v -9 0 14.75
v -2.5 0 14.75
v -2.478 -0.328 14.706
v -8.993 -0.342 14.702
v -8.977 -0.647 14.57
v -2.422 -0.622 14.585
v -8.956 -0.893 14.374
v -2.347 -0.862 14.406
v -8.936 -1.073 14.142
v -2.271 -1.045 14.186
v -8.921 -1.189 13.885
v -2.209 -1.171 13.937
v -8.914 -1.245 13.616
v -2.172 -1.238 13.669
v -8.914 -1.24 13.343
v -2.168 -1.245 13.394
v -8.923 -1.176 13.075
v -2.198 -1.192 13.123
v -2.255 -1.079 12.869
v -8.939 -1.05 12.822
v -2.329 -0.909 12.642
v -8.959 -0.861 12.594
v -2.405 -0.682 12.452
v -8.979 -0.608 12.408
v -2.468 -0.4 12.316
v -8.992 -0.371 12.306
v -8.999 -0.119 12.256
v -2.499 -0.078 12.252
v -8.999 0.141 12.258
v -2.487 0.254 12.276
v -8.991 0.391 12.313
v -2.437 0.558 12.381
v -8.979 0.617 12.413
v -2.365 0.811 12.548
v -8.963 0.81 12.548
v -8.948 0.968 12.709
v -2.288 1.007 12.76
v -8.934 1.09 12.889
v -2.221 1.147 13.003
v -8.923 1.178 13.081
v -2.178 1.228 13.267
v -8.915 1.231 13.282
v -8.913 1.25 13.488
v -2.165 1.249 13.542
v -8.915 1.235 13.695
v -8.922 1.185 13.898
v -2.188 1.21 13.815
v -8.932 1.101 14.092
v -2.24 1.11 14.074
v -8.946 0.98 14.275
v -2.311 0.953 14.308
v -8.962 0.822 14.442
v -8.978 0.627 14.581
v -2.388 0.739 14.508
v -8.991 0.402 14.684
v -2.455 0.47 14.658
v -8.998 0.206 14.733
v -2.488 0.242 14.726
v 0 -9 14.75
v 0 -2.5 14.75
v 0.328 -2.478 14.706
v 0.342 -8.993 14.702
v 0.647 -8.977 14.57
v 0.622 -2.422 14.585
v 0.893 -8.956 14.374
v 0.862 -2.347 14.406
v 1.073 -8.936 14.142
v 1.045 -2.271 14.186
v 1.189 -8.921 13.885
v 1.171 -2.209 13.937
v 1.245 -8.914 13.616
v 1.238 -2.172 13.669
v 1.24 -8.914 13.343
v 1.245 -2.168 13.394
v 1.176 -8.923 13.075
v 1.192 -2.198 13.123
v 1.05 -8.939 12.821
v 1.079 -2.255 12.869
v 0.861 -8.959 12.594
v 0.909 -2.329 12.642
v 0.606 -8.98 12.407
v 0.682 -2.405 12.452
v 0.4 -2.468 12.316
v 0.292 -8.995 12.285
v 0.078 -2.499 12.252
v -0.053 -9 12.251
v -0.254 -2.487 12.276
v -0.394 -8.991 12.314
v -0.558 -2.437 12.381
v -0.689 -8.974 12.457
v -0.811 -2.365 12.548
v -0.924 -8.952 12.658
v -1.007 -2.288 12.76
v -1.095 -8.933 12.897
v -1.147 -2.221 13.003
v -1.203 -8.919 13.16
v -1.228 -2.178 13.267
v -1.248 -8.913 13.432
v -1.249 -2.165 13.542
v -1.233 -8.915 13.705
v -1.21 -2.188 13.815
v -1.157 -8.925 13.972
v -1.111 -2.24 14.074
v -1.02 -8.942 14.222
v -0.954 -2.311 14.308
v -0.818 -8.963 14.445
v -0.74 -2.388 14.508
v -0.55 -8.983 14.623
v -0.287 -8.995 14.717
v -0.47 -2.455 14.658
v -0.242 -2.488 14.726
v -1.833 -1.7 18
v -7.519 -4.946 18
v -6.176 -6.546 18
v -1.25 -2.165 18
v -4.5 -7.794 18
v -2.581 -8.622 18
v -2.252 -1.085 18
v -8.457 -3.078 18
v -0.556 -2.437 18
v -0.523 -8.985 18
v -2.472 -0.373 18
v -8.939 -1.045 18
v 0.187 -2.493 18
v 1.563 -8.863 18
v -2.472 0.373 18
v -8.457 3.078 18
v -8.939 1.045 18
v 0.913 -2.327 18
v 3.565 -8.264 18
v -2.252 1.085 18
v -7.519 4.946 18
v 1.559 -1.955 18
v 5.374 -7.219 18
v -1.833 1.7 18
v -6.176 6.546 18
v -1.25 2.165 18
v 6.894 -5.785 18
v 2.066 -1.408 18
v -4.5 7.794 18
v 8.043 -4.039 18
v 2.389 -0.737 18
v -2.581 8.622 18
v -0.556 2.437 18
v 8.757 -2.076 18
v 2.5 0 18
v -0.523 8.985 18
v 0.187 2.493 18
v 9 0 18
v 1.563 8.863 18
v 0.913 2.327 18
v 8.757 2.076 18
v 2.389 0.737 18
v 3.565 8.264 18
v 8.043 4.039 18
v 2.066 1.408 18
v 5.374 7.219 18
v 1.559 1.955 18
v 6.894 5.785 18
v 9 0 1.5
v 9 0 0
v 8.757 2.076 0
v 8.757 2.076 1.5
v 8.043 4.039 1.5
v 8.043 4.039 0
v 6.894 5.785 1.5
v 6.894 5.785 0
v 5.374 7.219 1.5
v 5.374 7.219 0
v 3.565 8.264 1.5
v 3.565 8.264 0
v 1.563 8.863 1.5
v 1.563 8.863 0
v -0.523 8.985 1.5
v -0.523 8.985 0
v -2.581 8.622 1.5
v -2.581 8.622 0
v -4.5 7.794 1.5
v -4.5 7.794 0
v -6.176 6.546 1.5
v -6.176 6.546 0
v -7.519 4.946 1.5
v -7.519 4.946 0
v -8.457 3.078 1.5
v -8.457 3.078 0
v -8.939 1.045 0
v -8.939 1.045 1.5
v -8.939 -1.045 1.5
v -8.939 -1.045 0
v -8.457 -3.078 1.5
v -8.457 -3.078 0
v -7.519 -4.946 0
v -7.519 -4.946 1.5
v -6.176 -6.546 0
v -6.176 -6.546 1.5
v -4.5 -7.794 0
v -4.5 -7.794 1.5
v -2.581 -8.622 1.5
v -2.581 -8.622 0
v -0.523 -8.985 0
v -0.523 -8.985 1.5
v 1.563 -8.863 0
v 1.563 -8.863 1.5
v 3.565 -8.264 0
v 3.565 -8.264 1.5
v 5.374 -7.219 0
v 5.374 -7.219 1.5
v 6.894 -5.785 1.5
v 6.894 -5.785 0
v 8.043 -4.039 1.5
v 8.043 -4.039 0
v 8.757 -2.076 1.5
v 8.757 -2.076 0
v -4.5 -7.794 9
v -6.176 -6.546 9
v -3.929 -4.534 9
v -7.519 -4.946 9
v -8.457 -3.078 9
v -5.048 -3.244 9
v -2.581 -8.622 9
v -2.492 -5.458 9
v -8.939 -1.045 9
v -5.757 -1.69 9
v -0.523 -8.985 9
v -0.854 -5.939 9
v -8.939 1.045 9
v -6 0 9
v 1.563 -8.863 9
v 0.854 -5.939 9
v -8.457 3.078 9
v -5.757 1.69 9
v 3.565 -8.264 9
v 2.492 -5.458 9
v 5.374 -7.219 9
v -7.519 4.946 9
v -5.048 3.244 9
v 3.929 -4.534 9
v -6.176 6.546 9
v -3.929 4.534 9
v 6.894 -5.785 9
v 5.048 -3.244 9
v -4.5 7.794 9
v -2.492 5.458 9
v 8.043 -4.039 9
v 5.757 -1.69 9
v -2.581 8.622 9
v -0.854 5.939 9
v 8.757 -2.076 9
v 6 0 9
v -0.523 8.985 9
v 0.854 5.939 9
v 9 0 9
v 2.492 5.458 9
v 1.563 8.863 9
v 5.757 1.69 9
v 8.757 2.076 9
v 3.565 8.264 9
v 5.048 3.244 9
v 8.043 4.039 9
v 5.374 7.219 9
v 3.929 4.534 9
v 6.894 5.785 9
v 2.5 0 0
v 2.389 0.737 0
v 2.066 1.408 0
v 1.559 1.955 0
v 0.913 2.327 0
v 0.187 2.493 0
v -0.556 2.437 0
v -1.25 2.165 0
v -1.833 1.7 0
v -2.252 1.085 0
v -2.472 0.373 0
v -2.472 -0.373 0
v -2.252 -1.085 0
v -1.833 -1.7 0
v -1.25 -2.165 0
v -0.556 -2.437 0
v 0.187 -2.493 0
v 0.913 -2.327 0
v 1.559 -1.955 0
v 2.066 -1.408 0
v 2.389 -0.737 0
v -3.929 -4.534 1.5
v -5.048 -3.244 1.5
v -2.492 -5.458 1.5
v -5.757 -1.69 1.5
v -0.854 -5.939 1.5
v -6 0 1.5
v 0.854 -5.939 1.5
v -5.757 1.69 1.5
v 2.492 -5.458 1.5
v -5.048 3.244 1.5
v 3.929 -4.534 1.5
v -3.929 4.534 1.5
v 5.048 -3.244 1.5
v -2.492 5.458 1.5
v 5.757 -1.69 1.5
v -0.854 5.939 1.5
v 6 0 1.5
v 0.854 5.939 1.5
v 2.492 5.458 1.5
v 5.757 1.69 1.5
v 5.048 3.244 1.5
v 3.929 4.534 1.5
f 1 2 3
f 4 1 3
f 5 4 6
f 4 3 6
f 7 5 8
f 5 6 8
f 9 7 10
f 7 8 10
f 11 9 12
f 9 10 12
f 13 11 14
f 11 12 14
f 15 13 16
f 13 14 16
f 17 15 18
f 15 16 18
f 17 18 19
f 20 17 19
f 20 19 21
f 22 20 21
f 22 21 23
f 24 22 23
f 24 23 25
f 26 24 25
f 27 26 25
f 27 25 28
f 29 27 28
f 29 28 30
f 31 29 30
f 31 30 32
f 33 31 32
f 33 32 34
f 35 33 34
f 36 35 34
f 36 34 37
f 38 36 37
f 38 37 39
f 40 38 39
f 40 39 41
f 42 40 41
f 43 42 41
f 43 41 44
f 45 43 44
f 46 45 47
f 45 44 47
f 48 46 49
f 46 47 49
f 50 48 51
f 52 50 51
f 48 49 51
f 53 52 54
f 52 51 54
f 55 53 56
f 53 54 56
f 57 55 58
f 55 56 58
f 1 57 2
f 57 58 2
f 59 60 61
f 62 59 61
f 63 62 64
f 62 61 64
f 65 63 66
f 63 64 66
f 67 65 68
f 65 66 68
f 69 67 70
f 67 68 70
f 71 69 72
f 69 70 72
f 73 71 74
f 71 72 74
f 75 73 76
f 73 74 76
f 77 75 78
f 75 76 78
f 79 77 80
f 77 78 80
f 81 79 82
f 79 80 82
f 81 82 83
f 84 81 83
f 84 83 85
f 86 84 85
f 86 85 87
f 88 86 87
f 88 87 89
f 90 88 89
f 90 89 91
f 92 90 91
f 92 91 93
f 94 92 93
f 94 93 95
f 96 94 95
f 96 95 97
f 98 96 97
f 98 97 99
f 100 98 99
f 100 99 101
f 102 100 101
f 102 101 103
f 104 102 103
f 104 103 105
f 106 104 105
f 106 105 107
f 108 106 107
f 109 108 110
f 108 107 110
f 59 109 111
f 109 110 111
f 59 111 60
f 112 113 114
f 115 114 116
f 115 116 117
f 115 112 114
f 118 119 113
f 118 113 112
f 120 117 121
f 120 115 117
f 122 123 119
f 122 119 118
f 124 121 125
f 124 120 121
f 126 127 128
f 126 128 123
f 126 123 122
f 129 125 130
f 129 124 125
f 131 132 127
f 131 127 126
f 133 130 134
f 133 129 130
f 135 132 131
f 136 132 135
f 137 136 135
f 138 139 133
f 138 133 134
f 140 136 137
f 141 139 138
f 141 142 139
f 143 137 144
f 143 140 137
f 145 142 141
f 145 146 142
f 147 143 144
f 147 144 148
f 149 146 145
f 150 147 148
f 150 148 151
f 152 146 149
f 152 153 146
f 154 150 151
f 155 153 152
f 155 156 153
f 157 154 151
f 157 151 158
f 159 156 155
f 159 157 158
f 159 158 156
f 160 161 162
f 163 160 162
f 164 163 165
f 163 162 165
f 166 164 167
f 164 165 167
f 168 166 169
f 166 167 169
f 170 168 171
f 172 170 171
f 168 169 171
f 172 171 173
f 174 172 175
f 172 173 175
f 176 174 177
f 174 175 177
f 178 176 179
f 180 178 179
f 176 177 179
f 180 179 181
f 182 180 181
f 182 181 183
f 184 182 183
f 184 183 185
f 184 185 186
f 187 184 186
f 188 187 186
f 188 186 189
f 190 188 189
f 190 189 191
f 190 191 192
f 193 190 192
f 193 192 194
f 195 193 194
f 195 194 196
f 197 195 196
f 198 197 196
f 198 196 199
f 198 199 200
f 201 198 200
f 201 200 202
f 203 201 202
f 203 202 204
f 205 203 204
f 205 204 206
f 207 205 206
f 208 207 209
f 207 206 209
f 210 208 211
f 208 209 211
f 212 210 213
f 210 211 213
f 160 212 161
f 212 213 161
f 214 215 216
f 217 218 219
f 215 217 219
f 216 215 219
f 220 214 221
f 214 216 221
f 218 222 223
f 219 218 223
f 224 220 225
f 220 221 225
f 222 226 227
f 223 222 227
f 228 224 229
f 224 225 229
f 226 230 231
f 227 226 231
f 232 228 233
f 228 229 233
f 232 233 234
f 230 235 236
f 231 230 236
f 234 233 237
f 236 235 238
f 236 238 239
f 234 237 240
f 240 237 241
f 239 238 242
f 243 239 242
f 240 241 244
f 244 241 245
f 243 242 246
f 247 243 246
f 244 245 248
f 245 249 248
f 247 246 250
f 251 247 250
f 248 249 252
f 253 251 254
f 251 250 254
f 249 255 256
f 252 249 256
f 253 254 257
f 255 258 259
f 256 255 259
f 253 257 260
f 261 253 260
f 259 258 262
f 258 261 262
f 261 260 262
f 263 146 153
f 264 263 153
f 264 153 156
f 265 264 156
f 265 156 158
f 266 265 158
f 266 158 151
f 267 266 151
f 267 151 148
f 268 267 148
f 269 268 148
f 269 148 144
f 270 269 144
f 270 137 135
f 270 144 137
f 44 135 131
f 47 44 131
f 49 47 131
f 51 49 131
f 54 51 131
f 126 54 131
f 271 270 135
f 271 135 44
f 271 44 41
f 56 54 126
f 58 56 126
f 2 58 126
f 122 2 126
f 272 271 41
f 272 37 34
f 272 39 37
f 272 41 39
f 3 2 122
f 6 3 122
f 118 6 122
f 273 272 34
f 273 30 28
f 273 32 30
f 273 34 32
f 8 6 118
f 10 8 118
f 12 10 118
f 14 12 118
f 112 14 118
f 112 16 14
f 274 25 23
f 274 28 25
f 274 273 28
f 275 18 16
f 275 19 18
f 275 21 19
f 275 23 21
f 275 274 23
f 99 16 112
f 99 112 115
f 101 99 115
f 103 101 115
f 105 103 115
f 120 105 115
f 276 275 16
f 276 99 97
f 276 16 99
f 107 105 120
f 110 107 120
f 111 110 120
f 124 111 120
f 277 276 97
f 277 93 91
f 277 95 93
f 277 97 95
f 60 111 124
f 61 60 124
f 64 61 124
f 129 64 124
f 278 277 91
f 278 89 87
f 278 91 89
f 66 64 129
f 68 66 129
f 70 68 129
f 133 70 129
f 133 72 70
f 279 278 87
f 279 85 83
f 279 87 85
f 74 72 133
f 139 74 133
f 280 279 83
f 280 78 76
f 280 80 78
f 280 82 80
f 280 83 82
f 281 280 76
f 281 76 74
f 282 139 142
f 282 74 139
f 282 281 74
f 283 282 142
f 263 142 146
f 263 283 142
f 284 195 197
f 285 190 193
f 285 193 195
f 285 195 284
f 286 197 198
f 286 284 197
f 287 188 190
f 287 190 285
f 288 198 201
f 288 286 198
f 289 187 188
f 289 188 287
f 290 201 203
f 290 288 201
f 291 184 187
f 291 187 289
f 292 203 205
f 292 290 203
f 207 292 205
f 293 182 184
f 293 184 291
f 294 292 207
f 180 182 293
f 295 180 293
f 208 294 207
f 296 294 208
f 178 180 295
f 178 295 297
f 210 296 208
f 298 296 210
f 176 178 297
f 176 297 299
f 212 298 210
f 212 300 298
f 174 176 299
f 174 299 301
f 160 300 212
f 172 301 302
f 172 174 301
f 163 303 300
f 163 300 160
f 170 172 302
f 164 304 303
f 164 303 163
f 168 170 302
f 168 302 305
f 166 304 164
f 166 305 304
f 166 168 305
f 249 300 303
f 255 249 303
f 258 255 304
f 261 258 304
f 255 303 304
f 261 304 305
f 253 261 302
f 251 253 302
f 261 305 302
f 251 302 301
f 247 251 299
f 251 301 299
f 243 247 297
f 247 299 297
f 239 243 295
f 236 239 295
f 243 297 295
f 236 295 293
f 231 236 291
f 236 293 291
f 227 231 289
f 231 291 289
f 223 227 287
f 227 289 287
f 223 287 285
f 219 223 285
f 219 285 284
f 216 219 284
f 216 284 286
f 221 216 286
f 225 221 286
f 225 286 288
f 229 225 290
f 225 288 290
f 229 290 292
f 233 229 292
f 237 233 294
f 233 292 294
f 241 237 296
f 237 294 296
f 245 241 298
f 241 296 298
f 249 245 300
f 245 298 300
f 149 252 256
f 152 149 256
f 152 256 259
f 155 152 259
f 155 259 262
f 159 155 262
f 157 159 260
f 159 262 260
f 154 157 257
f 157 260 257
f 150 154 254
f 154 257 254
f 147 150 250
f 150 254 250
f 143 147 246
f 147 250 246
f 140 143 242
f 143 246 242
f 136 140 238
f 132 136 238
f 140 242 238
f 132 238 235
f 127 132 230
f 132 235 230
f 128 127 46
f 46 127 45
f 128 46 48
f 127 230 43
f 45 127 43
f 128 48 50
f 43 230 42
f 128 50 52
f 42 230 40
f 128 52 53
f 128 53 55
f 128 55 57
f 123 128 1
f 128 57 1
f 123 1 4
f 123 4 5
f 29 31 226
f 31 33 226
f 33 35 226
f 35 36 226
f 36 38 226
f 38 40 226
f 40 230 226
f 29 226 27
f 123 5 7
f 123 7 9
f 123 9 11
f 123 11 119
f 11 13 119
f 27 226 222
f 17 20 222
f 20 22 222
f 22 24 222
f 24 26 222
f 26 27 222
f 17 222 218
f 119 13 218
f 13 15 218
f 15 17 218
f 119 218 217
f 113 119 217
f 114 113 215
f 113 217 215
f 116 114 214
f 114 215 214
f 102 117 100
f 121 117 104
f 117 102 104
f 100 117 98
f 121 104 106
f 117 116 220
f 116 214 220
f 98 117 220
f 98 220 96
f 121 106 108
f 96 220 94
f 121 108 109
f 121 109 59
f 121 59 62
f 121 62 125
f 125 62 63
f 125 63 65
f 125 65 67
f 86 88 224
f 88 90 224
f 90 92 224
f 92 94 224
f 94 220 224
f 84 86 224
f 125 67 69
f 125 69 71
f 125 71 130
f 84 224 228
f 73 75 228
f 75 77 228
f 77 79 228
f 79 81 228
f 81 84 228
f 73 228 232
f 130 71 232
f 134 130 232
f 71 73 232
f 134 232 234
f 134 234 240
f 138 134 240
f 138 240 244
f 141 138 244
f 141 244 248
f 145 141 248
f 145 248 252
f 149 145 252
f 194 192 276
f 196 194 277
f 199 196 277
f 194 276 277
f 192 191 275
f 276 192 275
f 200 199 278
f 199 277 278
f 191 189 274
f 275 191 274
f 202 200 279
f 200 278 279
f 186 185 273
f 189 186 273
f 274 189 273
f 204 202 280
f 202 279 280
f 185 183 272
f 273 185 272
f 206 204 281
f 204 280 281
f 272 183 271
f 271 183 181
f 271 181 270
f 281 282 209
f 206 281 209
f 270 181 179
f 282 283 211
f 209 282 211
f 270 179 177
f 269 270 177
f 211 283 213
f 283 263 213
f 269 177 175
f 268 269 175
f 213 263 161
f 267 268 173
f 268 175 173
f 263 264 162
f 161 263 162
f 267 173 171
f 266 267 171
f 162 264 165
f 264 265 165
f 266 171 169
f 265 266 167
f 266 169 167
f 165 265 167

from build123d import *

# Parameters (mm, degrees)
ESQUISSE1_R                  = 9
BOSS_EXTRU_1_DEPTH           = 18
ENL_V_START                  = 1.5
ESQUISSE2_R                  = 9
ESQUISSE2_R_2                = 6
ENL_V_MAT_EXTRU_1_DEPTH      = 7.5
ESQUISSE3_R                  = 2.5
ENL_V_MAT_EXTRU_3_DEPTH      = 23.045407685
ESQUISSE4_R                  = 1.25
ENL_V_MAT_EXTRU_4_DEPTH      = 23.045407685
R_P_TITION_CIRCULAIRE1_COUNT = 2
R_P_TITION_CIRCULAIRE1_ANGLE = 90


with BuildPart() as part:
    # Esquisse1 → Boss.-Extru.1 (new body)
    with BuildSketch(Plane.XY):
        Circle(ESQUISSE1_R)
    extrude(amount=BOSS_EXTRU_1_DEPTH)

    # Esquisse2 → Enlèv. mat.-Extru.1 (cut)
    with BuildSketch(Plane.XY.offset(ENL_V_START)):
        Circle(ESQUISSE2_R)
        Circle(ESQUISSE2_R_2, mode=Mode.SUBTRACT)
    extrude(amount=ENL_V_MAT_EXTRU_1_DEPTH, mode=Mode.SUBTRACT)

    # Esquisse3 → Enlèv. mat.-Extru.3 (cut, through all)
    with BuildSketch(Plane.XY):
        Circle(ESQUISSE3_R)
    extrude(amount=ENL_V_MAT_EXTRU_3_DEPTH, mode=Mode.SUBTRACT)

    # Esquisse4 → Enlèv. mat.-Extru.4 (cut, through all)
    with BuildSketch(Plane(origin=(0, 0, 0), x_dir=(1, 0, 0), z_dir=(0, 1, 0))):
        with Locations(Location((0, -13.5, 0), (0, 0, 270))):
            Circle(ESQUISSE4_R)
    enl_v_mat_extru_4 = extrude(amount=-ENL_V_MAT_EXTRU_4_DEPTH, mode=Mode.SUBTRACT)

    # Répétition circulaire1: Enlèv. mat.-Extru.4 ×2 about axis
    r_p_tition_circulaire1_axis = Axis((0, 0, 18), (0, 0, -1))
    for i in range(1, R_P_TITION_CIRCULAIRE1_COUNT):
        add(enl_v_mat_extru_4.rotate(r_p_tition_circulaire1_axis, i * R_P_TITION_CIRCULAIRE1_ANGLE / (R_P_TITION_CIRCULAIRE1_COUNT - 1)), mode=Mode.SUBTRACT)


solid = part.part
